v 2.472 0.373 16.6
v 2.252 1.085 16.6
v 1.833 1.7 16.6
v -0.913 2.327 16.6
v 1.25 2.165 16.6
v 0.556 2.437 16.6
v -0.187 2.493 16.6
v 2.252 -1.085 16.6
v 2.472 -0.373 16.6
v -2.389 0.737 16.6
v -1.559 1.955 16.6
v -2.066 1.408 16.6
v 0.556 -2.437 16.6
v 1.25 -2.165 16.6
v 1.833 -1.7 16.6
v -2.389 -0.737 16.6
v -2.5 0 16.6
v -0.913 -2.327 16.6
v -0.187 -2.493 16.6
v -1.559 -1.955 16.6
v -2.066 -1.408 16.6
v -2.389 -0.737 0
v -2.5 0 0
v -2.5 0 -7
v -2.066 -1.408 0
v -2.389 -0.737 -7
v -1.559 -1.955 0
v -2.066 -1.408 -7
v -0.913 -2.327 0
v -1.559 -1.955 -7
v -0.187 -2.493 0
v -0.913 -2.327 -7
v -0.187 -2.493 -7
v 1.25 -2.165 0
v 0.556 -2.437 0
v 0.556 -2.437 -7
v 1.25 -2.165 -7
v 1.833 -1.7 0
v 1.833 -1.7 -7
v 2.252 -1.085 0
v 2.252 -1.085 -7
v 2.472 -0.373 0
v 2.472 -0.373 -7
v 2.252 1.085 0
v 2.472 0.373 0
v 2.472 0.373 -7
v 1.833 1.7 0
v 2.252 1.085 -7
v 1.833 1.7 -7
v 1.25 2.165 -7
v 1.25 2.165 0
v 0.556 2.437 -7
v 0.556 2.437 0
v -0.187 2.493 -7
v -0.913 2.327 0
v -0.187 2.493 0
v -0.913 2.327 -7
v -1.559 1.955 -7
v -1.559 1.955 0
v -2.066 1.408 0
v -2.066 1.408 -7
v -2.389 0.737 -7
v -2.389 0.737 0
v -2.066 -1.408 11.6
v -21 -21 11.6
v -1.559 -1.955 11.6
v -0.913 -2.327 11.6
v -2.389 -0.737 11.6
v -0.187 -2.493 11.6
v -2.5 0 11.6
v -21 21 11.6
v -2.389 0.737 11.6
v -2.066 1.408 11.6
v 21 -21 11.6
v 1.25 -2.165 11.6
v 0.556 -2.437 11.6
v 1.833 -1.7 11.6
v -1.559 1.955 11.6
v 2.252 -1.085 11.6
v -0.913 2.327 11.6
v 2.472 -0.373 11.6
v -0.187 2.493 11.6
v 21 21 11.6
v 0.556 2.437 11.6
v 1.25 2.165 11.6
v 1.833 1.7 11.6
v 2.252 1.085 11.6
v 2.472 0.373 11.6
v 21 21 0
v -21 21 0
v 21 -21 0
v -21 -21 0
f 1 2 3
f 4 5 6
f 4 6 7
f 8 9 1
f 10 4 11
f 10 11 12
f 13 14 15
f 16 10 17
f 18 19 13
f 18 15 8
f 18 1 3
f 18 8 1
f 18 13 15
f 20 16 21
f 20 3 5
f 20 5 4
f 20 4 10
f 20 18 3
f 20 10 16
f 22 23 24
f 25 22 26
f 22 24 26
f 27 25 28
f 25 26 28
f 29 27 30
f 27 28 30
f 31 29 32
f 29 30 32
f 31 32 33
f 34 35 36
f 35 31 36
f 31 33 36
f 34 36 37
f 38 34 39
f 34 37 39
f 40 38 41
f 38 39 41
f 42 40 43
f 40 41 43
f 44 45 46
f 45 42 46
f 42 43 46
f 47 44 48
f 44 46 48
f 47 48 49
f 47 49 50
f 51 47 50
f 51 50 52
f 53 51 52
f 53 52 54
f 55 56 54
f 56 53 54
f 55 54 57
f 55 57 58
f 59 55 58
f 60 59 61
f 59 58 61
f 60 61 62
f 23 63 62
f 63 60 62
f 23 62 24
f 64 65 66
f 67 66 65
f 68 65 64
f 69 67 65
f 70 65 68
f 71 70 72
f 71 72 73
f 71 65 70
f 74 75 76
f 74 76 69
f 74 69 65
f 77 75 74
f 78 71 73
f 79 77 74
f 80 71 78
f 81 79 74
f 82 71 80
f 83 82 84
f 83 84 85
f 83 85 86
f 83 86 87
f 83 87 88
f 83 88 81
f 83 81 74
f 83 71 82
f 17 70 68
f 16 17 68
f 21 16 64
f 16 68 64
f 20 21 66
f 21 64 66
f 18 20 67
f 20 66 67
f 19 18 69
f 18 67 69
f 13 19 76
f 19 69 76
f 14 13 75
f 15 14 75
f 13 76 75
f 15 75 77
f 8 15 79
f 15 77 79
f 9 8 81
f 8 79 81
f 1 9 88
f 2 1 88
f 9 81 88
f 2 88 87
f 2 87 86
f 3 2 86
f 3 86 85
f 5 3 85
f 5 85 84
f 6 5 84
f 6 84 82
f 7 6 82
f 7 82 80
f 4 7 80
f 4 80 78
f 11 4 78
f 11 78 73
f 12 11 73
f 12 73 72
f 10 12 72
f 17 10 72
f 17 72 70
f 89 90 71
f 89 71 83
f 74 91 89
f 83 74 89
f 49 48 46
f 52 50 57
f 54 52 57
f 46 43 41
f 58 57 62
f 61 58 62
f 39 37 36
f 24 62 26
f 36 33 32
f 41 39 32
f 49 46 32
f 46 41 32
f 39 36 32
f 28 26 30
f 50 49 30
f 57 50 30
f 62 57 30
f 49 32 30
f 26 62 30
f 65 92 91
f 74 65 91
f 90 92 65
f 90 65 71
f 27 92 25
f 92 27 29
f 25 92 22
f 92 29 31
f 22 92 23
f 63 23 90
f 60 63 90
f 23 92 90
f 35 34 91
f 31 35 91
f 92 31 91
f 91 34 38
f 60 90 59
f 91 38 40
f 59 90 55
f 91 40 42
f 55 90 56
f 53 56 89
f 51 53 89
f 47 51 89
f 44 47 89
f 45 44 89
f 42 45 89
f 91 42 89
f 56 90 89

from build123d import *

# Parameters (mm, degrees)
SKETCH1_W                = 42
SKETCH1_H                = 42
BOSS_EXTRUDE1_DEPTH      = 11.6
BOSS_EXTRUDE2_DEPTH      = 5
BOSS_EXTRUDE2_DEPTH_BACK = 18.6
SKETCH2_R                = 2.5


with BuildPart() as part:
    # Sketch1 → Boss-Extrude1 (new body)
    with BuildSketch(Plane.XY):
        Rectangle(SKETCH1_W, SKETCH1_H)
    extrude(amount=BOSS_EXTRUDE1_DEPTH)

    # Sketch2 → Boss-Extrude2 (add, two sides: drawn at the far end of the back side and taken through both)
    with BuildSketch(Plane.XY.offset(11.6).offset(-BOSS_EXTRUDE2_DEPTH_BACK)):
        with Locations(Location((0, 0, 0), (0, 0, 180))):
            Circle(SKETCH2_R)
    extrude(amount=BOSS_EXTRUDE2_DEPTH + BOSS_EXTRUDE2_DEPTH_BACK)


solid = part.part
